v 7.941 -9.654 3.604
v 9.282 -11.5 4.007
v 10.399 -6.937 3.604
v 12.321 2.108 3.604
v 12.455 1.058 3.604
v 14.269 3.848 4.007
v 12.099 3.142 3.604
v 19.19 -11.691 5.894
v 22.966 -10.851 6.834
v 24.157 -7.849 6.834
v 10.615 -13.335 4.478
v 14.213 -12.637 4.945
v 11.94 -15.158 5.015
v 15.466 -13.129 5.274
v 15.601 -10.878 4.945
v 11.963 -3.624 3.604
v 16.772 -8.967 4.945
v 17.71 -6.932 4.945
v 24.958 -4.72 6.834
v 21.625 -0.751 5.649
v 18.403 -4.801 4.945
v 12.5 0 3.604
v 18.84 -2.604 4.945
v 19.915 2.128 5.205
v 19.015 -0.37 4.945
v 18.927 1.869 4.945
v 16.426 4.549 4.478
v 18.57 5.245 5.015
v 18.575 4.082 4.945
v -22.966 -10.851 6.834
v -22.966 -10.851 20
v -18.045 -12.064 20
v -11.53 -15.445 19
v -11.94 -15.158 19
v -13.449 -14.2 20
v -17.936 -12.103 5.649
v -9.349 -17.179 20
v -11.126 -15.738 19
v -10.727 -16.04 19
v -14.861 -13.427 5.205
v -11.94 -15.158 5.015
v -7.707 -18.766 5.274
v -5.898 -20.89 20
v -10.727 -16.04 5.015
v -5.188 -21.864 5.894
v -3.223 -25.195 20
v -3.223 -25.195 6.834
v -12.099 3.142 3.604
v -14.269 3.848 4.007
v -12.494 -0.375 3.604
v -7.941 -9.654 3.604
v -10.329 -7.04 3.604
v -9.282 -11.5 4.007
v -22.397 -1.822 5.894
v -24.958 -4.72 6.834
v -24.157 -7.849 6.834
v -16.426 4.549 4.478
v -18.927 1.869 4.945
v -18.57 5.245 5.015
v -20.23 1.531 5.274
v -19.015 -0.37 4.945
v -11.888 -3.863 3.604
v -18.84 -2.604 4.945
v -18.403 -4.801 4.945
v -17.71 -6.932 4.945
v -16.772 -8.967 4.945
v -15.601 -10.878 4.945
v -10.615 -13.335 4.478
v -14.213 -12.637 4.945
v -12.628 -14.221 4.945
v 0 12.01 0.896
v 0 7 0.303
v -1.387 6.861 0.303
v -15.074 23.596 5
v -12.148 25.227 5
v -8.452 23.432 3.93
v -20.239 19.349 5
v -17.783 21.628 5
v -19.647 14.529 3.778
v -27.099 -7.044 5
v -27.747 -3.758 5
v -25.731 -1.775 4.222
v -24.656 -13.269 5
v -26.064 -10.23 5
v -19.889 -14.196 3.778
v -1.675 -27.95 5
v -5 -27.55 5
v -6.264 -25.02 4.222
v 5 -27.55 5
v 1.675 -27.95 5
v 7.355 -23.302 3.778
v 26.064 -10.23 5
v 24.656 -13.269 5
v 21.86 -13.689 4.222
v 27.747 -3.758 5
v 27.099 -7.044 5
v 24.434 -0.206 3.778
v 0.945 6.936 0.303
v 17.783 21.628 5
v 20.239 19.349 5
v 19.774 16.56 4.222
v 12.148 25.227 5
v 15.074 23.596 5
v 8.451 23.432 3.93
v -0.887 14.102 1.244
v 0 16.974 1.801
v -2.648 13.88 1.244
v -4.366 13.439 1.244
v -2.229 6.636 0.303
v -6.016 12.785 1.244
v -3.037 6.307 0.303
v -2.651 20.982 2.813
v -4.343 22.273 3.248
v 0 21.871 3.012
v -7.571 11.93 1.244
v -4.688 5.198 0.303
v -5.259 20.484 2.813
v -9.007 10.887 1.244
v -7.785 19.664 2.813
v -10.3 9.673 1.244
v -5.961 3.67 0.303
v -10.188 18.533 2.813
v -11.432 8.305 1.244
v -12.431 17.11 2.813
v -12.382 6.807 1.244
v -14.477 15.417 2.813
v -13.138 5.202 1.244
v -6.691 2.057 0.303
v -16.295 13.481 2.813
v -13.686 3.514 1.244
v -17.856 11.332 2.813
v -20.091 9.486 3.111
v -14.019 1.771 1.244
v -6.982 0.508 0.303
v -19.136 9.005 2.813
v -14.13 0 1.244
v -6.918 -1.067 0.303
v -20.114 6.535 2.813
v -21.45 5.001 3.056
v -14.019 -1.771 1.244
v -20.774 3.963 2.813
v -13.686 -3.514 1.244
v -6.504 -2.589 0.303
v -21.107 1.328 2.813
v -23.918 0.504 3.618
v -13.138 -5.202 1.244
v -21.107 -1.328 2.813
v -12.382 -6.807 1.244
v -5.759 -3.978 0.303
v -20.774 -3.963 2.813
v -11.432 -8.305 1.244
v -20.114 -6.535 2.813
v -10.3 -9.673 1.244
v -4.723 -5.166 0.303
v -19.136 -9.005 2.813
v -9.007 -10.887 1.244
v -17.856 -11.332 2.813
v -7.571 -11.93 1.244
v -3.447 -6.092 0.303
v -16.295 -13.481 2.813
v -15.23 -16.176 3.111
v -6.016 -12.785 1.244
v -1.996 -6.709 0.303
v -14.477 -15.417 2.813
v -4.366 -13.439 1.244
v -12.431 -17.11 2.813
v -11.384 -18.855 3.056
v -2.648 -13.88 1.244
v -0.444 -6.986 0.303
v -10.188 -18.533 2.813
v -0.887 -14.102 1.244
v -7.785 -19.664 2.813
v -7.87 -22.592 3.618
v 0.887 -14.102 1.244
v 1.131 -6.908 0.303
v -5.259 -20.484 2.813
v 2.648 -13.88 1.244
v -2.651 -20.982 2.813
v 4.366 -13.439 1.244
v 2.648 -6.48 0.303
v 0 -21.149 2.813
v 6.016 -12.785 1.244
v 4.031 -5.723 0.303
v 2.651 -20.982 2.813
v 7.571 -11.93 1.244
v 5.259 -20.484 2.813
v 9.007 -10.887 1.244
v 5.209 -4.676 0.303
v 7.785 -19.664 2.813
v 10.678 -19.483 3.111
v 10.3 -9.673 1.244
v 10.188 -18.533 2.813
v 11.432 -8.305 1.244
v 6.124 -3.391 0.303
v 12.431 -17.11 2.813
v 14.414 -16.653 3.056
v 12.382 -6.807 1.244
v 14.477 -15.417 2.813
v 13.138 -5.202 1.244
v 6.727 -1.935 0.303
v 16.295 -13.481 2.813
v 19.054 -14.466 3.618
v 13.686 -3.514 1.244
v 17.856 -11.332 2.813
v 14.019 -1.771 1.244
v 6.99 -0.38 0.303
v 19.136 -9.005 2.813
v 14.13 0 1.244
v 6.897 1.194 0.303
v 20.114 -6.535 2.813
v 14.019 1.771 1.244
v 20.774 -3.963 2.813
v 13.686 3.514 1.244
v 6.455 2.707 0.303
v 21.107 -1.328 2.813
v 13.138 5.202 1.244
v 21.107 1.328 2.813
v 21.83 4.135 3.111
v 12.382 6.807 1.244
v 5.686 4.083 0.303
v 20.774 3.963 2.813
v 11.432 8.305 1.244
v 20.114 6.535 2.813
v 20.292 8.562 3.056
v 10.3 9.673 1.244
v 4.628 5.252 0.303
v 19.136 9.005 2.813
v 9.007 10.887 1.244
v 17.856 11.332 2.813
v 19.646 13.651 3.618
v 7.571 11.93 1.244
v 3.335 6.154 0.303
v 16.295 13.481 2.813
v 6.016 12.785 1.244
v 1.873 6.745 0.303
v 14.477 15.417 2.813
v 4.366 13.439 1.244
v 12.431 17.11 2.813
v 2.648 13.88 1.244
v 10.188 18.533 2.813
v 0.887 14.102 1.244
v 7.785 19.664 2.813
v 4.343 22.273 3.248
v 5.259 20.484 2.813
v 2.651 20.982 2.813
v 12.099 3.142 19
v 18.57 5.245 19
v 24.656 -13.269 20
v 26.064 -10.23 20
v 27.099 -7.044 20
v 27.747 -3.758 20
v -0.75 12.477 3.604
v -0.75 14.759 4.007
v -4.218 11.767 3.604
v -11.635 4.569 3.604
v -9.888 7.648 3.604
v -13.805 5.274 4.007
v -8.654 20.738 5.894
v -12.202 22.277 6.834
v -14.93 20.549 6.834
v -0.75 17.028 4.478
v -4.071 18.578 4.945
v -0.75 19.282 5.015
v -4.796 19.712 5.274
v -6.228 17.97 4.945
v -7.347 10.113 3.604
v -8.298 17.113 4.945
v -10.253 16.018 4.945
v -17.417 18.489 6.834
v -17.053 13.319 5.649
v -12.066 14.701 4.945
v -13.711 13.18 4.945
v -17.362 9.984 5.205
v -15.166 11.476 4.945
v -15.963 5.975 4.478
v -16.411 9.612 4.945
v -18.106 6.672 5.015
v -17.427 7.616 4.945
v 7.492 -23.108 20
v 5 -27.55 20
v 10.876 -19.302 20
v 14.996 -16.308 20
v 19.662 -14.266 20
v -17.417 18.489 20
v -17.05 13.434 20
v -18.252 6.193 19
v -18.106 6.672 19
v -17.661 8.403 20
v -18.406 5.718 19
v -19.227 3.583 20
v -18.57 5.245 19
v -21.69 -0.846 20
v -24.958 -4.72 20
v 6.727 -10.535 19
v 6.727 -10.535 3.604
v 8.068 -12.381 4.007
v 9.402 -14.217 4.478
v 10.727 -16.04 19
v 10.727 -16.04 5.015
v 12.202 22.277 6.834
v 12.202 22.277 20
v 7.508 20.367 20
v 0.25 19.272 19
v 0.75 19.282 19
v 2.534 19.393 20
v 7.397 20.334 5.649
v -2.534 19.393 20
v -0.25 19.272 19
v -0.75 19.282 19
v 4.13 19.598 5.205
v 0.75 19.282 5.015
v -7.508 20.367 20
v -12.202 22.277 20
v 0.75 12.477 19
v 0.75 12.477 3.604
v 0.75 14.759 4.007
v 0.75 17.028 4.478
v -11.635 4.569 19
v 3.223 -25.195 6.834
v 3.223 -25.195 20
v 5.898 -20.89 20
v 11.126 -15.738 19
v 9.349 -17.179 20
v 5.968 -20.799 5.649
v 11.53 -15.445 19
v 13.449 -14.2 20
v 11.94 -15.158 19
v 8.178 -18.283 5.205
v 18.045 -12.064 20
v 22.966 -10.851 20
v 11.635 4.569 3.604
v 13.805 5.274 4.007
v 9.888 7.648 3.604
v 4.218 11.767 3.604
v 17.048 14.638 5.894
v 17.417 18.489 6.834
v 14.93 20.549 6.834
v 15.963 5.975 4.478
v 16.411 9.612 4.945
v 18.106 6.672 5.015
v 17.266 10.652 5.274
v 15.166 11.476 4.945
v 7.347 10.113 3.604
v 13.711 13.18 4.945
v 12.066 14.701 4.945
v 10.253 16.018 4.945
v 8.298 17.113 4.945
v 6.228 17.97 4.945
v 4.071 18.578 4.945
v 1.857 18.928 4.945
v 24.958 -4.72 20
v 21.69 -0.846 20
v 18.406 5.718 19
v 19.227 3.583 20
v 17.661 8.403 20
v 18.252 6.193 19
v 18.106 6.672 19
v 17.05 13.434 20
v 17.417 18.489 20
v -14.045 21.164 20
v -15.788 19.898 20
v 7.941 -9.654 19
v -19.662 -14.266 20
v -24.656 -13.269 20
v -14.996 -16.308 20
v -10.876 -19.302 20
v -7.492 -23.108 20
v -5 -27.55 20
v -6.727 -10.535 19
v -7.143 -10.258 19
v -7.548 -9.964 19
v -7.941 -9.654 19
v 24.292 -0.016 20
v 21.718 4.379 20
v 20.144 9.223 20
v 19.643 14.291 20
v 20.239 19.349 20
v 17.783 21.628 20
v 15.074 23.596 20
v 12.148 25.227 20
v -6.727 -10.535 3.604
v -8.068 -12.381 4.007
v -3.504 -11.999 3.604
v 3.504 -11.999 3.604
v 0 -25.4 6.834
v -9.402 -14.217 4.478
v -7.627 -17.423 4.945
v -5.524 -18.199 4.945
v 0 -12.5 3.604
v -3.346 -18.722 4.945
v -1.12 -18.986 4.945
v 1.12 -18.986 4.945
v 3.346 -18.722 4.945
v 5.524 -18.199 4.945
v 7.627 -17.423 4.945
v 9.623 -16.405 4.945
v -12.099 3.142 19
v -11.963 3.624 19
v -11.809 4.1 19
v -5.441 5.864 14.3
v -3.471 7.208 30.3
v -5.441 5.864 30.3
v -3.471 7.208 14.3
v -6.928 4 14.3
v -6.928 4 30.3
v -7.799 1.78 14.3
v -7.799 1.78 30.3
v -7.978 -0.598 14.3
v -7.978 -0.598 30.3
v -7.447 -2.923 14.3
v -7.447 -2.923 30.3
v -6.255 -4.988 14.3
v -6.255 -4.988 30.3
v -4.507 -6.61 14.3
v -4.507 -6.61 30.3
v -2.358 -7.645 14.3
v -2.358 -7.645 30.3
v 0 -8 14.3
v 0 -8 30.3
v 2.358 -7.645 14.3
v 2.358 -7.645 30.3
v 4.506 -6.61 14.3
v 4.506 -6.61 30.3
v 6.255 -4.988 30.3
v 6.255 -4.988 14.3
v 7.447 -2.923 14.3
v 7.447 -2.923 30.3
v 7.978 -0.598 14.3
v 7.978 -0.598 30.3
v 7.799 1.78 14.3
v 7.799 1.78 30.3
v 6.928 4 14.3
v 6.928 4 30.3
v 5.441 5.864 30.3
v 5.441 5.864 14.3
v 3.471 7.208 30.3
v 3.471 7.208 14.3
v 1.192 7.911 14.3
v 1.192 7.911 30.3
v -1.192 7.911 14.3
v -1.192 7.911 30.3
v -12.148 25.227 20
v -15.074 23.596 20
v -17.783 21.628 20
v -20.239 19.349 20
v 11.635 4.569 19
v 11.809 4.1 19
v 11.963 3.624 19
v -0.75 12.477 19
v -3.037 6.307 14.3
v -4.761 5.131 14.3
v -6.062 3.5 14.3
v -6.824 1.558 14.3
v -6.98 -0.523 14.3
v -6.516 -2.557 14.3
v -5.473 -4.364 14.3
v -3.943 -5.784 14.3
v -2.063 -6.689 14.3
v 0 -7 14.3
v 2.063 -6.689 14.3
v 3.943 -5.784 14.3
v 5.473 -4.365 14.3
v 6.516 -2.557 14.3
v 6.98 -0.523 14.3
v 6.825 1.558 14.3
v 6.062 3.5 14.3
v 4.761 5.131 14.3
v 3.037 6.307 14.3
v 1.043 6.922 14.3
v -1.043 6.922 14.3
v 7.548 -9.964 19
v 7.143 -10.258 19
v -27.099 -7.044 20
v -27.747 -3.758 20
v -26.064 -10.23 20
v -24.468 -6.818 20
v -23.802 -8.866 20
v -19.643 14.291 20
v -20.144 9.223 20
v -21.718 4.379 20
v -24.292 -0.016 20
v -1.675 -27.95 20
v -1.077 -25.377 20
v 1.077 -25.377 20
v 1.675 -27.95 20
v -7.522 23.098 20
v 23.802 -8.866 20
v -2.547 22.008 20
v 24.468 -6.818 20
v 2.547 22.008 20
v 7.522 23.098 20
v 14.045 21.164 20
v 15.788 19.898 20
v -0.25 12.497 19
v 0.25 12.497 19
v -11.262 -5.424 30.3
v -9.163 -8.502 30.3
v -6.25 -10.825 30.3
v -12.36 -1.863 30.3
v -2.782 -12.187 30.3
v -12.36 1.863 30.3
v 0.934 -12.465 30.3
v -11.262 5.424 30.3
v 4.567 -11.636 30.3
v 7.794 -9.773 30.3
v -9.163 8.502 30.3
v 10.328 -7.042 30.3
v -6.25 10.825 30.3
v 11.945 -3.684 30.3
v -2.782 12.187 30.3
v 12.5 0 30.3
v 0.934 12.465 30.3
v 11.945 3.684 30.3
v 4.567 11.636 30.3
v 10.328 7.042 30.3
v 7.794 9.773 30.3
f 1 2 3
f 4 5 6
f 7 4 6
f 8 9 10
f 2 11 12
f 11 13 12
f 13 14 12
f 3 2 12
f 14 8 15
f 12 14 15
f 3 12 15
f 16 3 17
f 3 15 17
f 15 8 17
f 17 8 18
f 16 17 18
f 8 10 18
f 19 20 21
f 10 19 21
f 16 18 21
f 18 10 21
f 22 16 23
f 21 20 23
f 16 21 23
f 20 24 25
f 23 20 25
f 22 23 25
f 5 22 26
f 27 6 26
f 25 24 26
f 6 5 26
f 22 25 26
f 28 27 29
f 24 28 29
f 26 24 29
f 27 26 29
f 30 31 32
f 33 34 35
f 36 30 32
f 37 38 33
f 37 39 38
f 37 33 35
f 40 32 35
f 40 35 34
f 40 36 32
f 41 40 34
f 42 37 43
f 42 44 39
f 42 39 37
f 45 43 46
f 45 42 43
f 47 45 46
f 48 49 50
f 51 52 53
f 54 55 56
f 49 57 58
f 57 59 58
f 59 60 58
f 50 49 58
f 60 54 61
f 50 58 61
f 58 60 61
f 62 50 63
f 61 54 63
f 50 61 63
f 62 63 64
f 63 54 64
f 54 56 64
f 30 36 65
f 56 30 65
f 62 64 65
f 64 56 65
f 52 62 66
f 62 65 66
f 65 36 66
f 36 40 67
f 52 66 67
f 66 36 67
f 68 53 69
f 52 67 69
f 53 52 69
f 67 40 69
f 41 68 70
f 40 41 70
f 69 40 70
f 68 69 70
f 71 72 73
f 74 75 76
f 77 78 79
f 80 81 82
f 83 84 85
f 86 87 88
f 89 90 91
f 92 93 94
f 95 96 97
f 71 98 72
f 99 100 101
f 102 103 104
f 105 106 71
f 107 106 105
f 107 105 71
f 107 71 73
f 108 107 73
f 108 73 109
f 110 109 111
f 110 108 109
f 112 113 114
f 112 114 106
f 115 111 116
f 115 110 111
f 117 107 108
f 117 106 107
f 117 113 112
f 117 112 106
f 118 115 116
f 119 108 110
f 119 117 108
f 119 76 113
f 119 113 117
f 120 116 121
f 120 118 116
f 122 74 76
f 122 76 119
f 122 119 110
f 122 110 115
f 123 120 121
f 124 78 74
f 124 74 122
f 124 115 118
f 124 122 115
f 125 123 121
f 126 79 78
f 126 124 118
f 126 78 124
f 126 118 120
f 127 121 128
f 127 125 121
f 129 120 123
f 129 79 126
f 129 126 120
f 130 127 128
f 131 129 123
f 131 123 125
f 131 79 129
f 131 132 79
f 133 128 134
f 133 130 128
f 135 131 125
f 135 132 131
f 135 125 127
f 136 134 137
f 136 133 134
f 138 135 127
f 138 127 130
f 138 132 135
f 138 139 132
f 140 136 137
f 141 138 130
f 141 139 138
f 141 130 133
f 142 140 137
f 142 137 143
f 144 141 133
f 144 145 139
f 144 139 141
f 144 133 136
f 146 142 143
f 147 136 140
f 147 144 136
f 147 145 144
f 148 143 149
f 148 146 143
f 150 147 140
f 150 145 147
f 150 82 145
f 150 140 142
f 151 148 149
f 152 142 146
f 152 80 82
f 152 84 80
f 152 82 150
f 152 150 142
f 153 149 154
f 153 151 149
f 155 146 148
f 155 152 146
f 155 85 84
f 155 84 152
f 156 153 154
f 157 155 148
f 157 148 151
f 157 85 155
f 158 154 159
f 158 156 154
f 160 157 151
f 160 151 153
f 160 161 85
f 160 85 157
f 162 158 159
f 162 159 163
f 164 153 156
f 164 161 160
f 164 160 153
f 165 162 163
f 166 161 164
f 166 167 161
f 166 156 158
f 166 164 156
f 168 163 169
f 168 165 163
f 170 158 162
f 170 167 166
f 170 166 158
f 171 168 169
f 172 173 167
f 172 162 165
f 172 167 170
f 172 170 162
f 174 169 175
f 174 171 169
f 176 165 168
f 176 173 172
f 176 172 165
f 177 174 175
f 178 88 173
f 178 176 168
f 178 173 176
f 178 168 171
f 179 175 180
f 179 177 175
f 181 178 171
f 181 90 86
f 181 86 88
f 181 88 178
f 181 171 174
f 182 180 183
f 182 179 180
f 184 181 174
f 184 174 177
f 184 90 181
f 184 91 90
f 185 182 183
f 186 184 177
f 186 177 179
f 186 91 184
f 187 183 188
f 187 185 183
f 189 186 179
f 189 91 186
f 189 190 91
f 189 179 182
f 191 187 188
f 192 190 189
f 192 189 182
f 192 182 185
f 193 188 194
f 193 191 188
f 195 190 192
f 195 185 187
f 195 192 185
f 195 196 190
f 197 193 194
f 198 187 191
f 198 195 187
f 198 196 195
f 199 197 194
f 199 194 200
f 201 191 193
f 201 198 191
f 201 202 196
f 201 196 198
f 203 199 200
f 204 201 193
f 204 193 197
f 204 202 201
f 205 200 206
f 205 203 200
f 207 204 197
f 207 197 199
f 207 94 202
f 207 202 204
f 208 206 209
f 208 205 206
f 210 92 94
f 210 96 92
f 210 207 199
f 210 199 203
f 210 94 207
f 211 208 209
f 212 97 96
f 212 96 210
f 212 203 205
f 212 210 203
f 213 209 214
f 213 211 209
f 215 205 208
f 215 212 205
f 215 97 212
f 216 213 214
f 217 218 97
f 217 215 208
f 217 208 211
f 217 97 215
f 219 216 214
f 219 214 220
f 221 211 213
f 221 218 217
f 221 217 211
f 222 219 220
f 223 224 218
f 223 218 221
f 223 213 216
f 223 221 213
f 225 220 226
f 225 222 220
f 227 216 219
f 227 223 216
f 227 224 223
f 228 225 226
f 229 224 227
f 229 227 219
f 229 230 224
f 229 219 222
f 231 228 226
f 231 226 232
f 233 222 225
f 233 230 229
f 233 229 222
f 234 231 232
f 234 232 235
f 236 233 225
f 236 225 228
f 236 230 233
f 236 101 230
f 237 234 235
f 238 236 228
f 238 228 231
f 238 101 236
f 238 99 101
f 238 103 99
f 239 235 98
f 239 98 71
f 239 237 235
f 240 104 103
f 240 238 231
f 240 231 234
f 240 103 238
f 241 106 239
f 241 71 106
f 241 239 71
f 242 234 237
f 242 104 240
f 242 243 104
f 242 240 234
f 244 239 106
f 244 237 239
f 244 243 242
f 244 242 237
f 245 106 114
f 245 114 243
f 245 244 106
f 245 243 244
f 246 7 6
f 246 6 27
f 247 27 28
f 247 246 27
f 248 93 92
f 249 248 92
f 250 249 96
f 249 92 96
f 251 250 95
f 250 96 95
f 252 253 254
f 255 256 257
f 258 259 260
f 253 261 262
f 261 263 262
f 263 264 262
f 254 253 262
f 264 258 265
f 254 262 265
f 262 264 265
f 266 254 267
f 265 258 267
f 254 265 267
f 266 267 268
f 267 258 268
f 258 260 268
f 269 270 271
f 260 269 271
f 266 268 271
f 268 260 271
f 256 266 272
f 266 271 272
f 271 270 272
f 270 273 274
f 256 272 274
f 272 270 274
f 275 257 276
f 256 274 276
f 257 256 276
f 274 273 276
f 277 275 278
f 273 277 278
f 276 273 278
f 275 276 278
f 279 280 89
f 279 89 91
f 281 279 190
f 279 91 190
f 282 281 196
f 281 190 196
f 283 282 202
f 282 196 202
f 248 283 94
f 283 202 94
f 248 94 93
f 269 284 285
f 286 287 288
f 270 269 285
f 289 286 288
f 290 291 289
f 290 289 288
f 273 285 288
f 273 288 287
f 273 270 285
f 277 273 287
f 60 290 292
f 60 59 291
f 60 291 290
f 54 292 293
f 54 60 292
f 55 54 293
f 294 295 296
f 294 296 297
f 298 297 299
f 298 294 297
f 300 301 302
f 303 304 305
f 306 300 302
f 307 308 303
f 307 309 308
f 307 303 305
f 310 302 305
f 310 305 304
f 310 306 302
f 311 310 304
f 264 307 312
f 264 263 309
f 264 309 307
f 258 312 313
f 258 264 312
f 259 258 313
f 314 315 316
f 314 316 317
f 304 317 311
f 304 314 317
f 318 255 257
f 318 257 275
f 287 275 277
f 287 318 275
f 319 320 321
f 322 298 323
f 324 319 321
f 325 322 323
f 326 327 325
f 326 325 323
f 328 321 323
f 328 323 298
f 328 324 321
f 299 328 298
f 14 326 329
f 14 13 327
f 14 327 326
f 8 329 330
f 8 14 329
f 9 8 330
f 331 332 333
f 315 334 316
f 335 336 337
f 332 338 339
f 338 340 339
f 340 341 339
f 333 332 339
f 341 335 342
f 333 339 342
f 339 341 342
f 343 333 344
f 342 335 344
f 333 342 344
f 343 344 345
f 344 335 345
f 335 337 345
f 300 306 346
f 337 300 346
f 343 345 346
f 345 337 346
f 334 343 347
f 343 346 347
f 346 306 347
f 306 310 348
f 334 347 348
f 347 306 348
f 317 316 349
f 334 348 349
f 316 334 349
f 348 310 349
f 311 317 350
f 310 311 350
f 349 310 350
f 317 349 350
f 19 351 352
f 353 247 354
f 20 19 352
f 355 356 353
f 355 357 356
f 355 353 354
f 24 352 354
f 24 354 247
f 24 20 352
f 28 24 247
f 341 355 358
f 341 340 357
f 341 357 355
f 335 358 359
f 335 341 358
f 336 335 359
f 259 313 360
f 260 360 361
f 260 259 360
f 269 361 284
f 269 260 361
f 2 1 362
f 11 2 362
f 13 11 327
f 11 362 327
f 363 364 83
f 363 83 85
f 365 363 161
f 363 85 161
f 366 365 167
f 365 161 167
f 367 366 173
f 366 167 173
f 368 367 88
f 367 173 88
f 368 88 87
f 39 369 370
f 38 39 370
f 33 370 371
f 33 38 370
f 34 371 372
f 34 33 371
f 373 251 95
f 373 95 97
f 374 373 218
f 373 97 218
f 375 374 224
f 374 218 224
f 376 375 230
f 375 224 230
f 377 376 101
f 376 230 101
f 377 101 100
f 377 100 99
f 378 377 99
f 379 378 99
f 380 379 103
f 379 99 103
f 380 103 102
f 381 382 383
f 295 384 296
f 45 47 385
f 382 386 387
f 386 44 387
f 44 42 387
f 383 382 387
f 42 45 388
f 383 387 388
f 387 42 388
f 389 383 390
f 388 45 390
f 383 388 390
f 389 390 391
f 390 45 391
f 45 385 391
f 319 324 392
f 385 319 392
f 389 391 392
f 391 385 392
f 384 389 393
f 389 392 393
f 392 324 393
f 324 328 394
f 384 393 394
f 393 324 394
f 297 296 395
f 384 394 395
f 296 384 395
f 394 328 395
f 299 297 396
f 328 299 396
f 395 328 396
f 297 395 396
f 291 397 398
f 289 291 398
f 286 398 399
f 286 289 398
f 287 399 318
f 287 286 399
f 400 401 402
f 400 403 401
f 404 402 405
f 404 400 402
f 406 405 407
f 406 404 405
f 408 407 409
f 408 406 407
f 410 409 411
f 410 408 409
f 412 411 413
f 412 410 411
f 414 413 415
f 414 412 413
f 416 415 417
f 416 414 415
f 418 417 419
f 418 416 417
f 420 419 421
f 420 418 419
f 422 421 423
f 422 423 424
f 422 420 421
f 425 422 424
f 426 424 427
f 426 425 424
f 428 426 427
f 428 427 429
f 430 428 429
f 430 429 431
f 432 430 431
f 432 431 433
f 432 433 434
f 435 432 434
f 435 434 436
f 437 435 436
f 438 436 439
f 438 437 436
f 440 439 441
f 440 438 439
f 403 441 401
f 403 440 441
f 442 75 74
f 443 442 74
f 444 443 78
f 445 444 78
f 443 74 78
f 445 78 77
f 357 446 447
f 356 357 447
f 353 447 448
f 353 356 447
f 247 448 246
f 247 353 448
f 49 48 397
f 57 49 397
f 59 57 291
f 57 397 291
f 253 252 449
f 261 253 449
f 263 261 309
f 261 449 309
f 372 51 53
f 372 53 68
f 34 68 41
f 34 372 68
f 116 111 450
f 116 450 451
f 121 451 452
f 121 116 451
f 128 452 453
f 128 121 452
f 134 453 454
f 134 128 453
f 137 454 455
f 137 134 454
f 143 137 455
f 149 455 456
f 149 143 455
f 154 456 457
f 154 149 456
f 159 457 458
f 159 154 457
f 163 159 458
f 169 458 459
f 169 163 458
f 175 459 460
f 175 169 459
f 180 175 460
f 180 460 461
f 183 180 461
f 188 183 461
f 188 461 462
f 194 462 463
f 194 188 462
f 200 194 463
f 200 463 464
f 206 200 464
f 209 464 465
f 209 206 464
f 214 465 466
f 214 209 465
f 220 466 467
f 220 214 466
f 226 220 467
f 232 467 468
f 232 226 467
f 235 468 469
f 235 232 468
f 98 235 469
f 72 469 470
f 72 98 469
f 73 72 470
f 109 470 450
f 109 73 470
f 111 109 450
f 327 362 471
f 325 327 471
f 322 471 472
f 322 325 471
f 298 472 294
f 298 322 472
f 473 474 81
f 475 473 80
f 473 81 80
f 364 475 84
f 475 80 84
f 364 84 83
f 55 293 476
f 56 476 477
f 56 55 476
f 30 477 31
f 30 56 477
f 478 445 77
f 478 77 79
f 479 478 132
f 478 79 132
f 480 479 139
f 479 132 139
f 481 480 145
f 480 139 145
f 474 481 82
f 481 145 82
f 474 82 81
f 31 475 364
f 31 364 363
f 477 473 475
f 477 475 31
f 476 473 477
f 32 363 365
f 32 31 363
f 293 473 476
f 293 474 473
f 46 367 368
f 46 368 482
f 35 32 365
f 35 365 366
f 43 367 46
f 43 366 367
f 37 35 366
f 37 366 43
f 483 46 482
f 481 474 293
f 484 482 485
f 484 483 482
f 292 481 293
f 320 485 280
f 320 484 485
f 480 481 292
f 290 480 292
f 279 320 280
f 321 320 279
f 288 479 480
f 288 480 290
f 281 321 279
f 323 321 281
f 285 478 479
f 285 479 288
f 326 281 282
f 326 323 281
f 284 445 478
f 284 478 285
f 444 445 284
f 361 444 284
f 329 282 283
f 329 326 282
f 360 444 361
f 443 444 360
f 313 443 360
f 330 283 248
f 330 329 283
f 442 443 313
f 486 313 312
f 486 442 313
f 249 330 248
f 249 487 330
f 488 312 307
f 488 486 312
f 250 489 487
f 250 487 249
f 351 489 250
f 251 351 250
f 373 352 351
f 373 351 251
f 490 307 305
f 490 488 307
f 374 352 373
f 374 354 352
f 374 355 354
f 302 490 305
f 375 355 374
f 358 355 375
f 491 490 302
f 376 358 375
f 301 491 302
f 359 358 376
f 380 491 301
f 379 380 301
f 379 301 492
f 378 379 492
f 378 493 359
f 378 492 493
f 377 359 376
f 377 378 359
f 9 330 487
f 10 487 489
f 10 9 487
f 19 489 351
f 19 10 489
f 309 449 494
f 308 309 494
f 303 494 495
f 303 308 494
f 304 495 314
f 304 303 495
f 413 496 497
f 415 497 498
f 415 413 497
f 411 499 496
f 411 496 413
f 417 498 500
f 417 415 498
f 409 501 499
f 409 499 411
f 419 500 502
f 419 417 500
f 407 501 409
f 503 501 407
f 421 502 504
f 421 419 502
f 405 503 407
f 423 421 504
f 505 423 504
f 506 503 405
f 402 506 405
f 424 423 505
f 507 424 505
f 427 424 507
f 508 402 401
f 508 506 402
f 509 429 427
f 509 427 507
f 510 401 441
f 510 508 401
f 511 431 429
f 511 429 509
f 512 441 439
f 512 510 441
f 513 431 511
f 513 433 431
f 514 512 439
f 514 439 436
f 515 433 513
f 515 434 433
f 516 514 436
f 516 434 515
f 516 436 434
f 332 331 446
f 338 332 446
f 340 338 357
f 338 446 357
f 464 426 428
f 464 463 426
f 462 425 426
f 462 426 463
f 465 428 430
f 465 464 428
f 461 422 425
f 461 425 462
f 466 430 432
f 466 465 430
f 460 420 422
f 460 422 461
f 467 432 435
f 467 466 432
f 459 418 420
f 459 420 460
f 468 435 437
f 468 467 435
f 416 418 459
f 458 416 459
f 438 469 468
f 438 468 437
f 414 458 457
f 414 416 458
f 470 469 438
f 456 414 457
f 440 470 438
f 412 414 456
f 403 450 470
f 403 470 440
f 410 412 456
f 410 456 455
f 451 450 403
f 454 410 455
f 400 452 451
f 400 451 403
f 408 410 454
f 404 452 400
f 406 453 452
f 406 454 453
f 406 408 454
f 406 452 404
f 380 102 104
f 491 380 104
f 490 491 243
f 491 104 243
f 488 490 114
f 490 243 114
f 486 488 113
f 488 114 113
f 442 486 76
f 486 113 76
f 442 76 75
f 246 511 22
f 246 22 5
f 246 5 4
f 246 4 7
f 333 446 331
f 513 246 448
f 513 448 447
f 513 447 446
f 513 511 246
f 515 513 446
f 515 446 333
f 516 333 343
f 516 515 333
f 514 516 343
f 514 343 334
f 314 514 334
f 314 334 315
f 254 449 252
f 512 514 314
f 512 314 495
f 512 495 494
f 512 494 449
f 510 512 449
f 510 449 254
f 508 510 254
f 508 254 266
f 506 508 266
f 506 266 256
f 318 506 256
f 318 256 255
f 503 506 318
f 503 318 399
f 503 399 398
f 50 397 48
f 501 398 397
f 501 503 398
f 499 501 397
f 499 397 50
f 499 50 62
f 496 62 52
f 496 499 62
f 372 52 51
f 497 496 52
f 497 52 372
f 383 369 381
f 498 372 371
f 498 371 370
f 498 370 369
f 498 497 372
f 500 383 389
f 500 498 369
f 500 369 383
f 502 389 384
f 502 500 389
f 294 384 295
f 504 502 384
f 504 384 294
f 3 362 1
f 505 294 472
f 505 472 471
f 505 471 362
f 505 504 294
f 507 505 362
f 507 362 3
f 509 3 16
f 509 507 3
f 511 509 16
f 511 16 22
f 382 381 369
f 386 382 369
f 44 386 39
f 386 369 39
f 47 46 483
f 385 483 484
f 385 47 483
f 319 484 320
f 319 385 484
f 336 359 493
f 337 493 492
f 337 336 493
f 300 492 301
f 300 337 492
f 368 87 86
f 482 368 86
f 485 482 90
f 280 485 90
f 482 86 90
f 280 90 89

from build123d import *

# Parameters (mm, degrees)
BOSS_EXTRU_1_DEPTH           = 20
COQUE1_T                     = -2.6
BOSS_EXTRU_2_REACH           = 51.719
BOSS_EXTRU_2_END_RADIUS      = 78.3
ESQUISSE4_R                  = 12.5
NERVURE1_REACH               = 45.628
ESQUISSE6_WALLS_W            = 1.5
ESQUISSE6_WALLS_H            = 96.027794688
R_P_TITION_CIRCULAIRE1_COUNT = 5


with BuildPart() as part:
    # Esquisse1 → Boss.-Extru.1 (new body)
    with BuildSketch(Plane.XY):
        with BuildLine():
            ThreePointArc((-12.14837206, 25.22730775), (-16.457987064, 22.652475842), (-20.238542003, 19.349455227))
            ThreePointArc((-20.238542003, 19.349455227), (-20.800515992, 6.758497338), (-27.746648844, -3.758121593))
            ThreePointArc((-27.746648844, -3.758121593), (-26.629582456, -8.652475842), (-24.656478901, -13.268686756))
            ThreePointArc((-24.656478901, -13.268686756), (-12.855425866, -17.693975742), (-5, -27.549954628))
            ThreePointArc((-5, -27.549954628), (0, -28), (5, -27.549954628))
            ThreePointArc((5, -27.549954628), (12.855425866, -17.693975742), (24.656478901, -13.268686756))
            ThreePointArc((24.656478901, -13.268686756), (26.629582456, -8.652475842), (27.746648844, -3.758121593))
            ThreePointArc((27.746648844, -3.758121593), (20.800515992, 6.758497338), (20.238542003, 19.349455227))
            ThreePointArc((20.238542003, 19.349455227), (16.457987064, 22.652475842), (12.14837206, 25.22730775))
            ThreePointArc((12.14837206, 25.22730775), (0, 21.87095681), (-12.14837206, 25.22730775))
        make_face()
    extrude(amount=BOSS_EXTRU_1_DEPTH)

    # Esquisse3 → Enlèvement de matière-Révolution3 (revolve, cut)
    with BuildSketch(Plane(origin=(0, 0, 0), x_dir=(0, 0, -1), z_dir=(1, 0, 0)), mode=Mode.PRIVATE) as enl_vement_de_mati_re_r_volution3_sk:
        with BuildLine():
            Line((-5, -28), (3.997916613, -28))
            Line((3.997916613, -28), (3.997916613, 0))
            Line((3.997916613, 0), (0, 0))
            ThreePointArc((0, 0), (-1.259809141, -14.221462653), (-5, -28))
        make_face()
    revolve(enl_vement_de_mati_re_r_volution3_sk.sketch.rotate(Axis((0, 0, 0), (0, 0, 1)), 180), axis=Axis((0, 0, 0), (0, 0, 1)), mode=Mode.SUBTRACT)

    # Coque1
    coque1_openings = [part.faces().sort_by_distance(p)[0] for p in [
        (0, 0, 20),
    ]]
    offset(amount=COQUE1_T, openings=coque1_openings)

    # Boss.-Extru.2: up to this sphere (the profile starts inside it)
    boss_extru_2_end = Location((0, 0, 80.9)) * Sphere(BOSS_EXTRU_2_END_RADIUS, mode=Mode.PRIVATE)
    # Esquisse4 → Boss.-Extru.2 (add, up to the surface)
    with BuildSketch(Plane.XY.offset(30.3), mode=Mode.PRIVATE) as boss_extru_2_sk1:
        Circle(ESQUISSE4_R)
    boss_extru_2_tool1 = extrude(boss_extru_2_sk1.sketch, amount=-BOSS_EXTRU_2_REACH, mode=Mode.PRIVATE) & boss_extru_2_end
    add(boss_extru_2_tool1.solids().sort_by_distance((0, 0, 30.3))[0])

    # Esquisse5 → Enlèvement de matière-Révolution4 (revolve, cut)
    with BuildSketch(Plane(origin=(0, 0, 0), x_dir=(1, 0, 0), z_dir=(0, 1, 0)), mode=Mode.PRIVATE) as enl_vement_de_mati_re_r_volution4_sk:
        Polygon((0, -30.3), (8, -30.3), (8, -14.3), (7, -14.3), (7, 4.215006275), (0, 4.215006275), align=None)
    revolve(enl_vement_de_mati_re_r_volution4_sk.sketch.rotate(Axis((0, 0, 0), (0, 0, 1)), 115.713439389), axis=Axis((0, 0, 0), (0, 0, 1)), mode=Mode.SUBTRACT)

    # Esquisse6 walls → Nervure1 (add, up to next)
    with BuildSketch(Plane.XY.offset(19), mode=Mode.PRIVATE) as nervure1_sk1:
        with Locations((0, 15.885478405)):
            Rectangle(ESQUISSE6_WALLS_W, ESQUISSE6_WALLS_H)
    nervure1_tool1 = extrude(nervure1_sk1.sketch, amount=-NERVURE1_REACH, mode=Mode.PRIVATE) - part.part
    nervure1 = nervure1_tool1.solids().sort_by_distance((0, 15.885478405, 19))[0]
    add(nervure1)

    # Répétition circulaire1: Nervure1 ×5 about axis
    r_p_tition_circulaire1_axis = Axis((0, 0, 0), (0, 0, -1))
    for i in range(1, R_P_TITION_CIRCULAIRE1_COUNT):
        add(nervure1.rotate(r_p_tition_circulaire1_axis, i * 360 / R_P_TITION_CIRCULAIRE1_COUNT))


solid = part.part
